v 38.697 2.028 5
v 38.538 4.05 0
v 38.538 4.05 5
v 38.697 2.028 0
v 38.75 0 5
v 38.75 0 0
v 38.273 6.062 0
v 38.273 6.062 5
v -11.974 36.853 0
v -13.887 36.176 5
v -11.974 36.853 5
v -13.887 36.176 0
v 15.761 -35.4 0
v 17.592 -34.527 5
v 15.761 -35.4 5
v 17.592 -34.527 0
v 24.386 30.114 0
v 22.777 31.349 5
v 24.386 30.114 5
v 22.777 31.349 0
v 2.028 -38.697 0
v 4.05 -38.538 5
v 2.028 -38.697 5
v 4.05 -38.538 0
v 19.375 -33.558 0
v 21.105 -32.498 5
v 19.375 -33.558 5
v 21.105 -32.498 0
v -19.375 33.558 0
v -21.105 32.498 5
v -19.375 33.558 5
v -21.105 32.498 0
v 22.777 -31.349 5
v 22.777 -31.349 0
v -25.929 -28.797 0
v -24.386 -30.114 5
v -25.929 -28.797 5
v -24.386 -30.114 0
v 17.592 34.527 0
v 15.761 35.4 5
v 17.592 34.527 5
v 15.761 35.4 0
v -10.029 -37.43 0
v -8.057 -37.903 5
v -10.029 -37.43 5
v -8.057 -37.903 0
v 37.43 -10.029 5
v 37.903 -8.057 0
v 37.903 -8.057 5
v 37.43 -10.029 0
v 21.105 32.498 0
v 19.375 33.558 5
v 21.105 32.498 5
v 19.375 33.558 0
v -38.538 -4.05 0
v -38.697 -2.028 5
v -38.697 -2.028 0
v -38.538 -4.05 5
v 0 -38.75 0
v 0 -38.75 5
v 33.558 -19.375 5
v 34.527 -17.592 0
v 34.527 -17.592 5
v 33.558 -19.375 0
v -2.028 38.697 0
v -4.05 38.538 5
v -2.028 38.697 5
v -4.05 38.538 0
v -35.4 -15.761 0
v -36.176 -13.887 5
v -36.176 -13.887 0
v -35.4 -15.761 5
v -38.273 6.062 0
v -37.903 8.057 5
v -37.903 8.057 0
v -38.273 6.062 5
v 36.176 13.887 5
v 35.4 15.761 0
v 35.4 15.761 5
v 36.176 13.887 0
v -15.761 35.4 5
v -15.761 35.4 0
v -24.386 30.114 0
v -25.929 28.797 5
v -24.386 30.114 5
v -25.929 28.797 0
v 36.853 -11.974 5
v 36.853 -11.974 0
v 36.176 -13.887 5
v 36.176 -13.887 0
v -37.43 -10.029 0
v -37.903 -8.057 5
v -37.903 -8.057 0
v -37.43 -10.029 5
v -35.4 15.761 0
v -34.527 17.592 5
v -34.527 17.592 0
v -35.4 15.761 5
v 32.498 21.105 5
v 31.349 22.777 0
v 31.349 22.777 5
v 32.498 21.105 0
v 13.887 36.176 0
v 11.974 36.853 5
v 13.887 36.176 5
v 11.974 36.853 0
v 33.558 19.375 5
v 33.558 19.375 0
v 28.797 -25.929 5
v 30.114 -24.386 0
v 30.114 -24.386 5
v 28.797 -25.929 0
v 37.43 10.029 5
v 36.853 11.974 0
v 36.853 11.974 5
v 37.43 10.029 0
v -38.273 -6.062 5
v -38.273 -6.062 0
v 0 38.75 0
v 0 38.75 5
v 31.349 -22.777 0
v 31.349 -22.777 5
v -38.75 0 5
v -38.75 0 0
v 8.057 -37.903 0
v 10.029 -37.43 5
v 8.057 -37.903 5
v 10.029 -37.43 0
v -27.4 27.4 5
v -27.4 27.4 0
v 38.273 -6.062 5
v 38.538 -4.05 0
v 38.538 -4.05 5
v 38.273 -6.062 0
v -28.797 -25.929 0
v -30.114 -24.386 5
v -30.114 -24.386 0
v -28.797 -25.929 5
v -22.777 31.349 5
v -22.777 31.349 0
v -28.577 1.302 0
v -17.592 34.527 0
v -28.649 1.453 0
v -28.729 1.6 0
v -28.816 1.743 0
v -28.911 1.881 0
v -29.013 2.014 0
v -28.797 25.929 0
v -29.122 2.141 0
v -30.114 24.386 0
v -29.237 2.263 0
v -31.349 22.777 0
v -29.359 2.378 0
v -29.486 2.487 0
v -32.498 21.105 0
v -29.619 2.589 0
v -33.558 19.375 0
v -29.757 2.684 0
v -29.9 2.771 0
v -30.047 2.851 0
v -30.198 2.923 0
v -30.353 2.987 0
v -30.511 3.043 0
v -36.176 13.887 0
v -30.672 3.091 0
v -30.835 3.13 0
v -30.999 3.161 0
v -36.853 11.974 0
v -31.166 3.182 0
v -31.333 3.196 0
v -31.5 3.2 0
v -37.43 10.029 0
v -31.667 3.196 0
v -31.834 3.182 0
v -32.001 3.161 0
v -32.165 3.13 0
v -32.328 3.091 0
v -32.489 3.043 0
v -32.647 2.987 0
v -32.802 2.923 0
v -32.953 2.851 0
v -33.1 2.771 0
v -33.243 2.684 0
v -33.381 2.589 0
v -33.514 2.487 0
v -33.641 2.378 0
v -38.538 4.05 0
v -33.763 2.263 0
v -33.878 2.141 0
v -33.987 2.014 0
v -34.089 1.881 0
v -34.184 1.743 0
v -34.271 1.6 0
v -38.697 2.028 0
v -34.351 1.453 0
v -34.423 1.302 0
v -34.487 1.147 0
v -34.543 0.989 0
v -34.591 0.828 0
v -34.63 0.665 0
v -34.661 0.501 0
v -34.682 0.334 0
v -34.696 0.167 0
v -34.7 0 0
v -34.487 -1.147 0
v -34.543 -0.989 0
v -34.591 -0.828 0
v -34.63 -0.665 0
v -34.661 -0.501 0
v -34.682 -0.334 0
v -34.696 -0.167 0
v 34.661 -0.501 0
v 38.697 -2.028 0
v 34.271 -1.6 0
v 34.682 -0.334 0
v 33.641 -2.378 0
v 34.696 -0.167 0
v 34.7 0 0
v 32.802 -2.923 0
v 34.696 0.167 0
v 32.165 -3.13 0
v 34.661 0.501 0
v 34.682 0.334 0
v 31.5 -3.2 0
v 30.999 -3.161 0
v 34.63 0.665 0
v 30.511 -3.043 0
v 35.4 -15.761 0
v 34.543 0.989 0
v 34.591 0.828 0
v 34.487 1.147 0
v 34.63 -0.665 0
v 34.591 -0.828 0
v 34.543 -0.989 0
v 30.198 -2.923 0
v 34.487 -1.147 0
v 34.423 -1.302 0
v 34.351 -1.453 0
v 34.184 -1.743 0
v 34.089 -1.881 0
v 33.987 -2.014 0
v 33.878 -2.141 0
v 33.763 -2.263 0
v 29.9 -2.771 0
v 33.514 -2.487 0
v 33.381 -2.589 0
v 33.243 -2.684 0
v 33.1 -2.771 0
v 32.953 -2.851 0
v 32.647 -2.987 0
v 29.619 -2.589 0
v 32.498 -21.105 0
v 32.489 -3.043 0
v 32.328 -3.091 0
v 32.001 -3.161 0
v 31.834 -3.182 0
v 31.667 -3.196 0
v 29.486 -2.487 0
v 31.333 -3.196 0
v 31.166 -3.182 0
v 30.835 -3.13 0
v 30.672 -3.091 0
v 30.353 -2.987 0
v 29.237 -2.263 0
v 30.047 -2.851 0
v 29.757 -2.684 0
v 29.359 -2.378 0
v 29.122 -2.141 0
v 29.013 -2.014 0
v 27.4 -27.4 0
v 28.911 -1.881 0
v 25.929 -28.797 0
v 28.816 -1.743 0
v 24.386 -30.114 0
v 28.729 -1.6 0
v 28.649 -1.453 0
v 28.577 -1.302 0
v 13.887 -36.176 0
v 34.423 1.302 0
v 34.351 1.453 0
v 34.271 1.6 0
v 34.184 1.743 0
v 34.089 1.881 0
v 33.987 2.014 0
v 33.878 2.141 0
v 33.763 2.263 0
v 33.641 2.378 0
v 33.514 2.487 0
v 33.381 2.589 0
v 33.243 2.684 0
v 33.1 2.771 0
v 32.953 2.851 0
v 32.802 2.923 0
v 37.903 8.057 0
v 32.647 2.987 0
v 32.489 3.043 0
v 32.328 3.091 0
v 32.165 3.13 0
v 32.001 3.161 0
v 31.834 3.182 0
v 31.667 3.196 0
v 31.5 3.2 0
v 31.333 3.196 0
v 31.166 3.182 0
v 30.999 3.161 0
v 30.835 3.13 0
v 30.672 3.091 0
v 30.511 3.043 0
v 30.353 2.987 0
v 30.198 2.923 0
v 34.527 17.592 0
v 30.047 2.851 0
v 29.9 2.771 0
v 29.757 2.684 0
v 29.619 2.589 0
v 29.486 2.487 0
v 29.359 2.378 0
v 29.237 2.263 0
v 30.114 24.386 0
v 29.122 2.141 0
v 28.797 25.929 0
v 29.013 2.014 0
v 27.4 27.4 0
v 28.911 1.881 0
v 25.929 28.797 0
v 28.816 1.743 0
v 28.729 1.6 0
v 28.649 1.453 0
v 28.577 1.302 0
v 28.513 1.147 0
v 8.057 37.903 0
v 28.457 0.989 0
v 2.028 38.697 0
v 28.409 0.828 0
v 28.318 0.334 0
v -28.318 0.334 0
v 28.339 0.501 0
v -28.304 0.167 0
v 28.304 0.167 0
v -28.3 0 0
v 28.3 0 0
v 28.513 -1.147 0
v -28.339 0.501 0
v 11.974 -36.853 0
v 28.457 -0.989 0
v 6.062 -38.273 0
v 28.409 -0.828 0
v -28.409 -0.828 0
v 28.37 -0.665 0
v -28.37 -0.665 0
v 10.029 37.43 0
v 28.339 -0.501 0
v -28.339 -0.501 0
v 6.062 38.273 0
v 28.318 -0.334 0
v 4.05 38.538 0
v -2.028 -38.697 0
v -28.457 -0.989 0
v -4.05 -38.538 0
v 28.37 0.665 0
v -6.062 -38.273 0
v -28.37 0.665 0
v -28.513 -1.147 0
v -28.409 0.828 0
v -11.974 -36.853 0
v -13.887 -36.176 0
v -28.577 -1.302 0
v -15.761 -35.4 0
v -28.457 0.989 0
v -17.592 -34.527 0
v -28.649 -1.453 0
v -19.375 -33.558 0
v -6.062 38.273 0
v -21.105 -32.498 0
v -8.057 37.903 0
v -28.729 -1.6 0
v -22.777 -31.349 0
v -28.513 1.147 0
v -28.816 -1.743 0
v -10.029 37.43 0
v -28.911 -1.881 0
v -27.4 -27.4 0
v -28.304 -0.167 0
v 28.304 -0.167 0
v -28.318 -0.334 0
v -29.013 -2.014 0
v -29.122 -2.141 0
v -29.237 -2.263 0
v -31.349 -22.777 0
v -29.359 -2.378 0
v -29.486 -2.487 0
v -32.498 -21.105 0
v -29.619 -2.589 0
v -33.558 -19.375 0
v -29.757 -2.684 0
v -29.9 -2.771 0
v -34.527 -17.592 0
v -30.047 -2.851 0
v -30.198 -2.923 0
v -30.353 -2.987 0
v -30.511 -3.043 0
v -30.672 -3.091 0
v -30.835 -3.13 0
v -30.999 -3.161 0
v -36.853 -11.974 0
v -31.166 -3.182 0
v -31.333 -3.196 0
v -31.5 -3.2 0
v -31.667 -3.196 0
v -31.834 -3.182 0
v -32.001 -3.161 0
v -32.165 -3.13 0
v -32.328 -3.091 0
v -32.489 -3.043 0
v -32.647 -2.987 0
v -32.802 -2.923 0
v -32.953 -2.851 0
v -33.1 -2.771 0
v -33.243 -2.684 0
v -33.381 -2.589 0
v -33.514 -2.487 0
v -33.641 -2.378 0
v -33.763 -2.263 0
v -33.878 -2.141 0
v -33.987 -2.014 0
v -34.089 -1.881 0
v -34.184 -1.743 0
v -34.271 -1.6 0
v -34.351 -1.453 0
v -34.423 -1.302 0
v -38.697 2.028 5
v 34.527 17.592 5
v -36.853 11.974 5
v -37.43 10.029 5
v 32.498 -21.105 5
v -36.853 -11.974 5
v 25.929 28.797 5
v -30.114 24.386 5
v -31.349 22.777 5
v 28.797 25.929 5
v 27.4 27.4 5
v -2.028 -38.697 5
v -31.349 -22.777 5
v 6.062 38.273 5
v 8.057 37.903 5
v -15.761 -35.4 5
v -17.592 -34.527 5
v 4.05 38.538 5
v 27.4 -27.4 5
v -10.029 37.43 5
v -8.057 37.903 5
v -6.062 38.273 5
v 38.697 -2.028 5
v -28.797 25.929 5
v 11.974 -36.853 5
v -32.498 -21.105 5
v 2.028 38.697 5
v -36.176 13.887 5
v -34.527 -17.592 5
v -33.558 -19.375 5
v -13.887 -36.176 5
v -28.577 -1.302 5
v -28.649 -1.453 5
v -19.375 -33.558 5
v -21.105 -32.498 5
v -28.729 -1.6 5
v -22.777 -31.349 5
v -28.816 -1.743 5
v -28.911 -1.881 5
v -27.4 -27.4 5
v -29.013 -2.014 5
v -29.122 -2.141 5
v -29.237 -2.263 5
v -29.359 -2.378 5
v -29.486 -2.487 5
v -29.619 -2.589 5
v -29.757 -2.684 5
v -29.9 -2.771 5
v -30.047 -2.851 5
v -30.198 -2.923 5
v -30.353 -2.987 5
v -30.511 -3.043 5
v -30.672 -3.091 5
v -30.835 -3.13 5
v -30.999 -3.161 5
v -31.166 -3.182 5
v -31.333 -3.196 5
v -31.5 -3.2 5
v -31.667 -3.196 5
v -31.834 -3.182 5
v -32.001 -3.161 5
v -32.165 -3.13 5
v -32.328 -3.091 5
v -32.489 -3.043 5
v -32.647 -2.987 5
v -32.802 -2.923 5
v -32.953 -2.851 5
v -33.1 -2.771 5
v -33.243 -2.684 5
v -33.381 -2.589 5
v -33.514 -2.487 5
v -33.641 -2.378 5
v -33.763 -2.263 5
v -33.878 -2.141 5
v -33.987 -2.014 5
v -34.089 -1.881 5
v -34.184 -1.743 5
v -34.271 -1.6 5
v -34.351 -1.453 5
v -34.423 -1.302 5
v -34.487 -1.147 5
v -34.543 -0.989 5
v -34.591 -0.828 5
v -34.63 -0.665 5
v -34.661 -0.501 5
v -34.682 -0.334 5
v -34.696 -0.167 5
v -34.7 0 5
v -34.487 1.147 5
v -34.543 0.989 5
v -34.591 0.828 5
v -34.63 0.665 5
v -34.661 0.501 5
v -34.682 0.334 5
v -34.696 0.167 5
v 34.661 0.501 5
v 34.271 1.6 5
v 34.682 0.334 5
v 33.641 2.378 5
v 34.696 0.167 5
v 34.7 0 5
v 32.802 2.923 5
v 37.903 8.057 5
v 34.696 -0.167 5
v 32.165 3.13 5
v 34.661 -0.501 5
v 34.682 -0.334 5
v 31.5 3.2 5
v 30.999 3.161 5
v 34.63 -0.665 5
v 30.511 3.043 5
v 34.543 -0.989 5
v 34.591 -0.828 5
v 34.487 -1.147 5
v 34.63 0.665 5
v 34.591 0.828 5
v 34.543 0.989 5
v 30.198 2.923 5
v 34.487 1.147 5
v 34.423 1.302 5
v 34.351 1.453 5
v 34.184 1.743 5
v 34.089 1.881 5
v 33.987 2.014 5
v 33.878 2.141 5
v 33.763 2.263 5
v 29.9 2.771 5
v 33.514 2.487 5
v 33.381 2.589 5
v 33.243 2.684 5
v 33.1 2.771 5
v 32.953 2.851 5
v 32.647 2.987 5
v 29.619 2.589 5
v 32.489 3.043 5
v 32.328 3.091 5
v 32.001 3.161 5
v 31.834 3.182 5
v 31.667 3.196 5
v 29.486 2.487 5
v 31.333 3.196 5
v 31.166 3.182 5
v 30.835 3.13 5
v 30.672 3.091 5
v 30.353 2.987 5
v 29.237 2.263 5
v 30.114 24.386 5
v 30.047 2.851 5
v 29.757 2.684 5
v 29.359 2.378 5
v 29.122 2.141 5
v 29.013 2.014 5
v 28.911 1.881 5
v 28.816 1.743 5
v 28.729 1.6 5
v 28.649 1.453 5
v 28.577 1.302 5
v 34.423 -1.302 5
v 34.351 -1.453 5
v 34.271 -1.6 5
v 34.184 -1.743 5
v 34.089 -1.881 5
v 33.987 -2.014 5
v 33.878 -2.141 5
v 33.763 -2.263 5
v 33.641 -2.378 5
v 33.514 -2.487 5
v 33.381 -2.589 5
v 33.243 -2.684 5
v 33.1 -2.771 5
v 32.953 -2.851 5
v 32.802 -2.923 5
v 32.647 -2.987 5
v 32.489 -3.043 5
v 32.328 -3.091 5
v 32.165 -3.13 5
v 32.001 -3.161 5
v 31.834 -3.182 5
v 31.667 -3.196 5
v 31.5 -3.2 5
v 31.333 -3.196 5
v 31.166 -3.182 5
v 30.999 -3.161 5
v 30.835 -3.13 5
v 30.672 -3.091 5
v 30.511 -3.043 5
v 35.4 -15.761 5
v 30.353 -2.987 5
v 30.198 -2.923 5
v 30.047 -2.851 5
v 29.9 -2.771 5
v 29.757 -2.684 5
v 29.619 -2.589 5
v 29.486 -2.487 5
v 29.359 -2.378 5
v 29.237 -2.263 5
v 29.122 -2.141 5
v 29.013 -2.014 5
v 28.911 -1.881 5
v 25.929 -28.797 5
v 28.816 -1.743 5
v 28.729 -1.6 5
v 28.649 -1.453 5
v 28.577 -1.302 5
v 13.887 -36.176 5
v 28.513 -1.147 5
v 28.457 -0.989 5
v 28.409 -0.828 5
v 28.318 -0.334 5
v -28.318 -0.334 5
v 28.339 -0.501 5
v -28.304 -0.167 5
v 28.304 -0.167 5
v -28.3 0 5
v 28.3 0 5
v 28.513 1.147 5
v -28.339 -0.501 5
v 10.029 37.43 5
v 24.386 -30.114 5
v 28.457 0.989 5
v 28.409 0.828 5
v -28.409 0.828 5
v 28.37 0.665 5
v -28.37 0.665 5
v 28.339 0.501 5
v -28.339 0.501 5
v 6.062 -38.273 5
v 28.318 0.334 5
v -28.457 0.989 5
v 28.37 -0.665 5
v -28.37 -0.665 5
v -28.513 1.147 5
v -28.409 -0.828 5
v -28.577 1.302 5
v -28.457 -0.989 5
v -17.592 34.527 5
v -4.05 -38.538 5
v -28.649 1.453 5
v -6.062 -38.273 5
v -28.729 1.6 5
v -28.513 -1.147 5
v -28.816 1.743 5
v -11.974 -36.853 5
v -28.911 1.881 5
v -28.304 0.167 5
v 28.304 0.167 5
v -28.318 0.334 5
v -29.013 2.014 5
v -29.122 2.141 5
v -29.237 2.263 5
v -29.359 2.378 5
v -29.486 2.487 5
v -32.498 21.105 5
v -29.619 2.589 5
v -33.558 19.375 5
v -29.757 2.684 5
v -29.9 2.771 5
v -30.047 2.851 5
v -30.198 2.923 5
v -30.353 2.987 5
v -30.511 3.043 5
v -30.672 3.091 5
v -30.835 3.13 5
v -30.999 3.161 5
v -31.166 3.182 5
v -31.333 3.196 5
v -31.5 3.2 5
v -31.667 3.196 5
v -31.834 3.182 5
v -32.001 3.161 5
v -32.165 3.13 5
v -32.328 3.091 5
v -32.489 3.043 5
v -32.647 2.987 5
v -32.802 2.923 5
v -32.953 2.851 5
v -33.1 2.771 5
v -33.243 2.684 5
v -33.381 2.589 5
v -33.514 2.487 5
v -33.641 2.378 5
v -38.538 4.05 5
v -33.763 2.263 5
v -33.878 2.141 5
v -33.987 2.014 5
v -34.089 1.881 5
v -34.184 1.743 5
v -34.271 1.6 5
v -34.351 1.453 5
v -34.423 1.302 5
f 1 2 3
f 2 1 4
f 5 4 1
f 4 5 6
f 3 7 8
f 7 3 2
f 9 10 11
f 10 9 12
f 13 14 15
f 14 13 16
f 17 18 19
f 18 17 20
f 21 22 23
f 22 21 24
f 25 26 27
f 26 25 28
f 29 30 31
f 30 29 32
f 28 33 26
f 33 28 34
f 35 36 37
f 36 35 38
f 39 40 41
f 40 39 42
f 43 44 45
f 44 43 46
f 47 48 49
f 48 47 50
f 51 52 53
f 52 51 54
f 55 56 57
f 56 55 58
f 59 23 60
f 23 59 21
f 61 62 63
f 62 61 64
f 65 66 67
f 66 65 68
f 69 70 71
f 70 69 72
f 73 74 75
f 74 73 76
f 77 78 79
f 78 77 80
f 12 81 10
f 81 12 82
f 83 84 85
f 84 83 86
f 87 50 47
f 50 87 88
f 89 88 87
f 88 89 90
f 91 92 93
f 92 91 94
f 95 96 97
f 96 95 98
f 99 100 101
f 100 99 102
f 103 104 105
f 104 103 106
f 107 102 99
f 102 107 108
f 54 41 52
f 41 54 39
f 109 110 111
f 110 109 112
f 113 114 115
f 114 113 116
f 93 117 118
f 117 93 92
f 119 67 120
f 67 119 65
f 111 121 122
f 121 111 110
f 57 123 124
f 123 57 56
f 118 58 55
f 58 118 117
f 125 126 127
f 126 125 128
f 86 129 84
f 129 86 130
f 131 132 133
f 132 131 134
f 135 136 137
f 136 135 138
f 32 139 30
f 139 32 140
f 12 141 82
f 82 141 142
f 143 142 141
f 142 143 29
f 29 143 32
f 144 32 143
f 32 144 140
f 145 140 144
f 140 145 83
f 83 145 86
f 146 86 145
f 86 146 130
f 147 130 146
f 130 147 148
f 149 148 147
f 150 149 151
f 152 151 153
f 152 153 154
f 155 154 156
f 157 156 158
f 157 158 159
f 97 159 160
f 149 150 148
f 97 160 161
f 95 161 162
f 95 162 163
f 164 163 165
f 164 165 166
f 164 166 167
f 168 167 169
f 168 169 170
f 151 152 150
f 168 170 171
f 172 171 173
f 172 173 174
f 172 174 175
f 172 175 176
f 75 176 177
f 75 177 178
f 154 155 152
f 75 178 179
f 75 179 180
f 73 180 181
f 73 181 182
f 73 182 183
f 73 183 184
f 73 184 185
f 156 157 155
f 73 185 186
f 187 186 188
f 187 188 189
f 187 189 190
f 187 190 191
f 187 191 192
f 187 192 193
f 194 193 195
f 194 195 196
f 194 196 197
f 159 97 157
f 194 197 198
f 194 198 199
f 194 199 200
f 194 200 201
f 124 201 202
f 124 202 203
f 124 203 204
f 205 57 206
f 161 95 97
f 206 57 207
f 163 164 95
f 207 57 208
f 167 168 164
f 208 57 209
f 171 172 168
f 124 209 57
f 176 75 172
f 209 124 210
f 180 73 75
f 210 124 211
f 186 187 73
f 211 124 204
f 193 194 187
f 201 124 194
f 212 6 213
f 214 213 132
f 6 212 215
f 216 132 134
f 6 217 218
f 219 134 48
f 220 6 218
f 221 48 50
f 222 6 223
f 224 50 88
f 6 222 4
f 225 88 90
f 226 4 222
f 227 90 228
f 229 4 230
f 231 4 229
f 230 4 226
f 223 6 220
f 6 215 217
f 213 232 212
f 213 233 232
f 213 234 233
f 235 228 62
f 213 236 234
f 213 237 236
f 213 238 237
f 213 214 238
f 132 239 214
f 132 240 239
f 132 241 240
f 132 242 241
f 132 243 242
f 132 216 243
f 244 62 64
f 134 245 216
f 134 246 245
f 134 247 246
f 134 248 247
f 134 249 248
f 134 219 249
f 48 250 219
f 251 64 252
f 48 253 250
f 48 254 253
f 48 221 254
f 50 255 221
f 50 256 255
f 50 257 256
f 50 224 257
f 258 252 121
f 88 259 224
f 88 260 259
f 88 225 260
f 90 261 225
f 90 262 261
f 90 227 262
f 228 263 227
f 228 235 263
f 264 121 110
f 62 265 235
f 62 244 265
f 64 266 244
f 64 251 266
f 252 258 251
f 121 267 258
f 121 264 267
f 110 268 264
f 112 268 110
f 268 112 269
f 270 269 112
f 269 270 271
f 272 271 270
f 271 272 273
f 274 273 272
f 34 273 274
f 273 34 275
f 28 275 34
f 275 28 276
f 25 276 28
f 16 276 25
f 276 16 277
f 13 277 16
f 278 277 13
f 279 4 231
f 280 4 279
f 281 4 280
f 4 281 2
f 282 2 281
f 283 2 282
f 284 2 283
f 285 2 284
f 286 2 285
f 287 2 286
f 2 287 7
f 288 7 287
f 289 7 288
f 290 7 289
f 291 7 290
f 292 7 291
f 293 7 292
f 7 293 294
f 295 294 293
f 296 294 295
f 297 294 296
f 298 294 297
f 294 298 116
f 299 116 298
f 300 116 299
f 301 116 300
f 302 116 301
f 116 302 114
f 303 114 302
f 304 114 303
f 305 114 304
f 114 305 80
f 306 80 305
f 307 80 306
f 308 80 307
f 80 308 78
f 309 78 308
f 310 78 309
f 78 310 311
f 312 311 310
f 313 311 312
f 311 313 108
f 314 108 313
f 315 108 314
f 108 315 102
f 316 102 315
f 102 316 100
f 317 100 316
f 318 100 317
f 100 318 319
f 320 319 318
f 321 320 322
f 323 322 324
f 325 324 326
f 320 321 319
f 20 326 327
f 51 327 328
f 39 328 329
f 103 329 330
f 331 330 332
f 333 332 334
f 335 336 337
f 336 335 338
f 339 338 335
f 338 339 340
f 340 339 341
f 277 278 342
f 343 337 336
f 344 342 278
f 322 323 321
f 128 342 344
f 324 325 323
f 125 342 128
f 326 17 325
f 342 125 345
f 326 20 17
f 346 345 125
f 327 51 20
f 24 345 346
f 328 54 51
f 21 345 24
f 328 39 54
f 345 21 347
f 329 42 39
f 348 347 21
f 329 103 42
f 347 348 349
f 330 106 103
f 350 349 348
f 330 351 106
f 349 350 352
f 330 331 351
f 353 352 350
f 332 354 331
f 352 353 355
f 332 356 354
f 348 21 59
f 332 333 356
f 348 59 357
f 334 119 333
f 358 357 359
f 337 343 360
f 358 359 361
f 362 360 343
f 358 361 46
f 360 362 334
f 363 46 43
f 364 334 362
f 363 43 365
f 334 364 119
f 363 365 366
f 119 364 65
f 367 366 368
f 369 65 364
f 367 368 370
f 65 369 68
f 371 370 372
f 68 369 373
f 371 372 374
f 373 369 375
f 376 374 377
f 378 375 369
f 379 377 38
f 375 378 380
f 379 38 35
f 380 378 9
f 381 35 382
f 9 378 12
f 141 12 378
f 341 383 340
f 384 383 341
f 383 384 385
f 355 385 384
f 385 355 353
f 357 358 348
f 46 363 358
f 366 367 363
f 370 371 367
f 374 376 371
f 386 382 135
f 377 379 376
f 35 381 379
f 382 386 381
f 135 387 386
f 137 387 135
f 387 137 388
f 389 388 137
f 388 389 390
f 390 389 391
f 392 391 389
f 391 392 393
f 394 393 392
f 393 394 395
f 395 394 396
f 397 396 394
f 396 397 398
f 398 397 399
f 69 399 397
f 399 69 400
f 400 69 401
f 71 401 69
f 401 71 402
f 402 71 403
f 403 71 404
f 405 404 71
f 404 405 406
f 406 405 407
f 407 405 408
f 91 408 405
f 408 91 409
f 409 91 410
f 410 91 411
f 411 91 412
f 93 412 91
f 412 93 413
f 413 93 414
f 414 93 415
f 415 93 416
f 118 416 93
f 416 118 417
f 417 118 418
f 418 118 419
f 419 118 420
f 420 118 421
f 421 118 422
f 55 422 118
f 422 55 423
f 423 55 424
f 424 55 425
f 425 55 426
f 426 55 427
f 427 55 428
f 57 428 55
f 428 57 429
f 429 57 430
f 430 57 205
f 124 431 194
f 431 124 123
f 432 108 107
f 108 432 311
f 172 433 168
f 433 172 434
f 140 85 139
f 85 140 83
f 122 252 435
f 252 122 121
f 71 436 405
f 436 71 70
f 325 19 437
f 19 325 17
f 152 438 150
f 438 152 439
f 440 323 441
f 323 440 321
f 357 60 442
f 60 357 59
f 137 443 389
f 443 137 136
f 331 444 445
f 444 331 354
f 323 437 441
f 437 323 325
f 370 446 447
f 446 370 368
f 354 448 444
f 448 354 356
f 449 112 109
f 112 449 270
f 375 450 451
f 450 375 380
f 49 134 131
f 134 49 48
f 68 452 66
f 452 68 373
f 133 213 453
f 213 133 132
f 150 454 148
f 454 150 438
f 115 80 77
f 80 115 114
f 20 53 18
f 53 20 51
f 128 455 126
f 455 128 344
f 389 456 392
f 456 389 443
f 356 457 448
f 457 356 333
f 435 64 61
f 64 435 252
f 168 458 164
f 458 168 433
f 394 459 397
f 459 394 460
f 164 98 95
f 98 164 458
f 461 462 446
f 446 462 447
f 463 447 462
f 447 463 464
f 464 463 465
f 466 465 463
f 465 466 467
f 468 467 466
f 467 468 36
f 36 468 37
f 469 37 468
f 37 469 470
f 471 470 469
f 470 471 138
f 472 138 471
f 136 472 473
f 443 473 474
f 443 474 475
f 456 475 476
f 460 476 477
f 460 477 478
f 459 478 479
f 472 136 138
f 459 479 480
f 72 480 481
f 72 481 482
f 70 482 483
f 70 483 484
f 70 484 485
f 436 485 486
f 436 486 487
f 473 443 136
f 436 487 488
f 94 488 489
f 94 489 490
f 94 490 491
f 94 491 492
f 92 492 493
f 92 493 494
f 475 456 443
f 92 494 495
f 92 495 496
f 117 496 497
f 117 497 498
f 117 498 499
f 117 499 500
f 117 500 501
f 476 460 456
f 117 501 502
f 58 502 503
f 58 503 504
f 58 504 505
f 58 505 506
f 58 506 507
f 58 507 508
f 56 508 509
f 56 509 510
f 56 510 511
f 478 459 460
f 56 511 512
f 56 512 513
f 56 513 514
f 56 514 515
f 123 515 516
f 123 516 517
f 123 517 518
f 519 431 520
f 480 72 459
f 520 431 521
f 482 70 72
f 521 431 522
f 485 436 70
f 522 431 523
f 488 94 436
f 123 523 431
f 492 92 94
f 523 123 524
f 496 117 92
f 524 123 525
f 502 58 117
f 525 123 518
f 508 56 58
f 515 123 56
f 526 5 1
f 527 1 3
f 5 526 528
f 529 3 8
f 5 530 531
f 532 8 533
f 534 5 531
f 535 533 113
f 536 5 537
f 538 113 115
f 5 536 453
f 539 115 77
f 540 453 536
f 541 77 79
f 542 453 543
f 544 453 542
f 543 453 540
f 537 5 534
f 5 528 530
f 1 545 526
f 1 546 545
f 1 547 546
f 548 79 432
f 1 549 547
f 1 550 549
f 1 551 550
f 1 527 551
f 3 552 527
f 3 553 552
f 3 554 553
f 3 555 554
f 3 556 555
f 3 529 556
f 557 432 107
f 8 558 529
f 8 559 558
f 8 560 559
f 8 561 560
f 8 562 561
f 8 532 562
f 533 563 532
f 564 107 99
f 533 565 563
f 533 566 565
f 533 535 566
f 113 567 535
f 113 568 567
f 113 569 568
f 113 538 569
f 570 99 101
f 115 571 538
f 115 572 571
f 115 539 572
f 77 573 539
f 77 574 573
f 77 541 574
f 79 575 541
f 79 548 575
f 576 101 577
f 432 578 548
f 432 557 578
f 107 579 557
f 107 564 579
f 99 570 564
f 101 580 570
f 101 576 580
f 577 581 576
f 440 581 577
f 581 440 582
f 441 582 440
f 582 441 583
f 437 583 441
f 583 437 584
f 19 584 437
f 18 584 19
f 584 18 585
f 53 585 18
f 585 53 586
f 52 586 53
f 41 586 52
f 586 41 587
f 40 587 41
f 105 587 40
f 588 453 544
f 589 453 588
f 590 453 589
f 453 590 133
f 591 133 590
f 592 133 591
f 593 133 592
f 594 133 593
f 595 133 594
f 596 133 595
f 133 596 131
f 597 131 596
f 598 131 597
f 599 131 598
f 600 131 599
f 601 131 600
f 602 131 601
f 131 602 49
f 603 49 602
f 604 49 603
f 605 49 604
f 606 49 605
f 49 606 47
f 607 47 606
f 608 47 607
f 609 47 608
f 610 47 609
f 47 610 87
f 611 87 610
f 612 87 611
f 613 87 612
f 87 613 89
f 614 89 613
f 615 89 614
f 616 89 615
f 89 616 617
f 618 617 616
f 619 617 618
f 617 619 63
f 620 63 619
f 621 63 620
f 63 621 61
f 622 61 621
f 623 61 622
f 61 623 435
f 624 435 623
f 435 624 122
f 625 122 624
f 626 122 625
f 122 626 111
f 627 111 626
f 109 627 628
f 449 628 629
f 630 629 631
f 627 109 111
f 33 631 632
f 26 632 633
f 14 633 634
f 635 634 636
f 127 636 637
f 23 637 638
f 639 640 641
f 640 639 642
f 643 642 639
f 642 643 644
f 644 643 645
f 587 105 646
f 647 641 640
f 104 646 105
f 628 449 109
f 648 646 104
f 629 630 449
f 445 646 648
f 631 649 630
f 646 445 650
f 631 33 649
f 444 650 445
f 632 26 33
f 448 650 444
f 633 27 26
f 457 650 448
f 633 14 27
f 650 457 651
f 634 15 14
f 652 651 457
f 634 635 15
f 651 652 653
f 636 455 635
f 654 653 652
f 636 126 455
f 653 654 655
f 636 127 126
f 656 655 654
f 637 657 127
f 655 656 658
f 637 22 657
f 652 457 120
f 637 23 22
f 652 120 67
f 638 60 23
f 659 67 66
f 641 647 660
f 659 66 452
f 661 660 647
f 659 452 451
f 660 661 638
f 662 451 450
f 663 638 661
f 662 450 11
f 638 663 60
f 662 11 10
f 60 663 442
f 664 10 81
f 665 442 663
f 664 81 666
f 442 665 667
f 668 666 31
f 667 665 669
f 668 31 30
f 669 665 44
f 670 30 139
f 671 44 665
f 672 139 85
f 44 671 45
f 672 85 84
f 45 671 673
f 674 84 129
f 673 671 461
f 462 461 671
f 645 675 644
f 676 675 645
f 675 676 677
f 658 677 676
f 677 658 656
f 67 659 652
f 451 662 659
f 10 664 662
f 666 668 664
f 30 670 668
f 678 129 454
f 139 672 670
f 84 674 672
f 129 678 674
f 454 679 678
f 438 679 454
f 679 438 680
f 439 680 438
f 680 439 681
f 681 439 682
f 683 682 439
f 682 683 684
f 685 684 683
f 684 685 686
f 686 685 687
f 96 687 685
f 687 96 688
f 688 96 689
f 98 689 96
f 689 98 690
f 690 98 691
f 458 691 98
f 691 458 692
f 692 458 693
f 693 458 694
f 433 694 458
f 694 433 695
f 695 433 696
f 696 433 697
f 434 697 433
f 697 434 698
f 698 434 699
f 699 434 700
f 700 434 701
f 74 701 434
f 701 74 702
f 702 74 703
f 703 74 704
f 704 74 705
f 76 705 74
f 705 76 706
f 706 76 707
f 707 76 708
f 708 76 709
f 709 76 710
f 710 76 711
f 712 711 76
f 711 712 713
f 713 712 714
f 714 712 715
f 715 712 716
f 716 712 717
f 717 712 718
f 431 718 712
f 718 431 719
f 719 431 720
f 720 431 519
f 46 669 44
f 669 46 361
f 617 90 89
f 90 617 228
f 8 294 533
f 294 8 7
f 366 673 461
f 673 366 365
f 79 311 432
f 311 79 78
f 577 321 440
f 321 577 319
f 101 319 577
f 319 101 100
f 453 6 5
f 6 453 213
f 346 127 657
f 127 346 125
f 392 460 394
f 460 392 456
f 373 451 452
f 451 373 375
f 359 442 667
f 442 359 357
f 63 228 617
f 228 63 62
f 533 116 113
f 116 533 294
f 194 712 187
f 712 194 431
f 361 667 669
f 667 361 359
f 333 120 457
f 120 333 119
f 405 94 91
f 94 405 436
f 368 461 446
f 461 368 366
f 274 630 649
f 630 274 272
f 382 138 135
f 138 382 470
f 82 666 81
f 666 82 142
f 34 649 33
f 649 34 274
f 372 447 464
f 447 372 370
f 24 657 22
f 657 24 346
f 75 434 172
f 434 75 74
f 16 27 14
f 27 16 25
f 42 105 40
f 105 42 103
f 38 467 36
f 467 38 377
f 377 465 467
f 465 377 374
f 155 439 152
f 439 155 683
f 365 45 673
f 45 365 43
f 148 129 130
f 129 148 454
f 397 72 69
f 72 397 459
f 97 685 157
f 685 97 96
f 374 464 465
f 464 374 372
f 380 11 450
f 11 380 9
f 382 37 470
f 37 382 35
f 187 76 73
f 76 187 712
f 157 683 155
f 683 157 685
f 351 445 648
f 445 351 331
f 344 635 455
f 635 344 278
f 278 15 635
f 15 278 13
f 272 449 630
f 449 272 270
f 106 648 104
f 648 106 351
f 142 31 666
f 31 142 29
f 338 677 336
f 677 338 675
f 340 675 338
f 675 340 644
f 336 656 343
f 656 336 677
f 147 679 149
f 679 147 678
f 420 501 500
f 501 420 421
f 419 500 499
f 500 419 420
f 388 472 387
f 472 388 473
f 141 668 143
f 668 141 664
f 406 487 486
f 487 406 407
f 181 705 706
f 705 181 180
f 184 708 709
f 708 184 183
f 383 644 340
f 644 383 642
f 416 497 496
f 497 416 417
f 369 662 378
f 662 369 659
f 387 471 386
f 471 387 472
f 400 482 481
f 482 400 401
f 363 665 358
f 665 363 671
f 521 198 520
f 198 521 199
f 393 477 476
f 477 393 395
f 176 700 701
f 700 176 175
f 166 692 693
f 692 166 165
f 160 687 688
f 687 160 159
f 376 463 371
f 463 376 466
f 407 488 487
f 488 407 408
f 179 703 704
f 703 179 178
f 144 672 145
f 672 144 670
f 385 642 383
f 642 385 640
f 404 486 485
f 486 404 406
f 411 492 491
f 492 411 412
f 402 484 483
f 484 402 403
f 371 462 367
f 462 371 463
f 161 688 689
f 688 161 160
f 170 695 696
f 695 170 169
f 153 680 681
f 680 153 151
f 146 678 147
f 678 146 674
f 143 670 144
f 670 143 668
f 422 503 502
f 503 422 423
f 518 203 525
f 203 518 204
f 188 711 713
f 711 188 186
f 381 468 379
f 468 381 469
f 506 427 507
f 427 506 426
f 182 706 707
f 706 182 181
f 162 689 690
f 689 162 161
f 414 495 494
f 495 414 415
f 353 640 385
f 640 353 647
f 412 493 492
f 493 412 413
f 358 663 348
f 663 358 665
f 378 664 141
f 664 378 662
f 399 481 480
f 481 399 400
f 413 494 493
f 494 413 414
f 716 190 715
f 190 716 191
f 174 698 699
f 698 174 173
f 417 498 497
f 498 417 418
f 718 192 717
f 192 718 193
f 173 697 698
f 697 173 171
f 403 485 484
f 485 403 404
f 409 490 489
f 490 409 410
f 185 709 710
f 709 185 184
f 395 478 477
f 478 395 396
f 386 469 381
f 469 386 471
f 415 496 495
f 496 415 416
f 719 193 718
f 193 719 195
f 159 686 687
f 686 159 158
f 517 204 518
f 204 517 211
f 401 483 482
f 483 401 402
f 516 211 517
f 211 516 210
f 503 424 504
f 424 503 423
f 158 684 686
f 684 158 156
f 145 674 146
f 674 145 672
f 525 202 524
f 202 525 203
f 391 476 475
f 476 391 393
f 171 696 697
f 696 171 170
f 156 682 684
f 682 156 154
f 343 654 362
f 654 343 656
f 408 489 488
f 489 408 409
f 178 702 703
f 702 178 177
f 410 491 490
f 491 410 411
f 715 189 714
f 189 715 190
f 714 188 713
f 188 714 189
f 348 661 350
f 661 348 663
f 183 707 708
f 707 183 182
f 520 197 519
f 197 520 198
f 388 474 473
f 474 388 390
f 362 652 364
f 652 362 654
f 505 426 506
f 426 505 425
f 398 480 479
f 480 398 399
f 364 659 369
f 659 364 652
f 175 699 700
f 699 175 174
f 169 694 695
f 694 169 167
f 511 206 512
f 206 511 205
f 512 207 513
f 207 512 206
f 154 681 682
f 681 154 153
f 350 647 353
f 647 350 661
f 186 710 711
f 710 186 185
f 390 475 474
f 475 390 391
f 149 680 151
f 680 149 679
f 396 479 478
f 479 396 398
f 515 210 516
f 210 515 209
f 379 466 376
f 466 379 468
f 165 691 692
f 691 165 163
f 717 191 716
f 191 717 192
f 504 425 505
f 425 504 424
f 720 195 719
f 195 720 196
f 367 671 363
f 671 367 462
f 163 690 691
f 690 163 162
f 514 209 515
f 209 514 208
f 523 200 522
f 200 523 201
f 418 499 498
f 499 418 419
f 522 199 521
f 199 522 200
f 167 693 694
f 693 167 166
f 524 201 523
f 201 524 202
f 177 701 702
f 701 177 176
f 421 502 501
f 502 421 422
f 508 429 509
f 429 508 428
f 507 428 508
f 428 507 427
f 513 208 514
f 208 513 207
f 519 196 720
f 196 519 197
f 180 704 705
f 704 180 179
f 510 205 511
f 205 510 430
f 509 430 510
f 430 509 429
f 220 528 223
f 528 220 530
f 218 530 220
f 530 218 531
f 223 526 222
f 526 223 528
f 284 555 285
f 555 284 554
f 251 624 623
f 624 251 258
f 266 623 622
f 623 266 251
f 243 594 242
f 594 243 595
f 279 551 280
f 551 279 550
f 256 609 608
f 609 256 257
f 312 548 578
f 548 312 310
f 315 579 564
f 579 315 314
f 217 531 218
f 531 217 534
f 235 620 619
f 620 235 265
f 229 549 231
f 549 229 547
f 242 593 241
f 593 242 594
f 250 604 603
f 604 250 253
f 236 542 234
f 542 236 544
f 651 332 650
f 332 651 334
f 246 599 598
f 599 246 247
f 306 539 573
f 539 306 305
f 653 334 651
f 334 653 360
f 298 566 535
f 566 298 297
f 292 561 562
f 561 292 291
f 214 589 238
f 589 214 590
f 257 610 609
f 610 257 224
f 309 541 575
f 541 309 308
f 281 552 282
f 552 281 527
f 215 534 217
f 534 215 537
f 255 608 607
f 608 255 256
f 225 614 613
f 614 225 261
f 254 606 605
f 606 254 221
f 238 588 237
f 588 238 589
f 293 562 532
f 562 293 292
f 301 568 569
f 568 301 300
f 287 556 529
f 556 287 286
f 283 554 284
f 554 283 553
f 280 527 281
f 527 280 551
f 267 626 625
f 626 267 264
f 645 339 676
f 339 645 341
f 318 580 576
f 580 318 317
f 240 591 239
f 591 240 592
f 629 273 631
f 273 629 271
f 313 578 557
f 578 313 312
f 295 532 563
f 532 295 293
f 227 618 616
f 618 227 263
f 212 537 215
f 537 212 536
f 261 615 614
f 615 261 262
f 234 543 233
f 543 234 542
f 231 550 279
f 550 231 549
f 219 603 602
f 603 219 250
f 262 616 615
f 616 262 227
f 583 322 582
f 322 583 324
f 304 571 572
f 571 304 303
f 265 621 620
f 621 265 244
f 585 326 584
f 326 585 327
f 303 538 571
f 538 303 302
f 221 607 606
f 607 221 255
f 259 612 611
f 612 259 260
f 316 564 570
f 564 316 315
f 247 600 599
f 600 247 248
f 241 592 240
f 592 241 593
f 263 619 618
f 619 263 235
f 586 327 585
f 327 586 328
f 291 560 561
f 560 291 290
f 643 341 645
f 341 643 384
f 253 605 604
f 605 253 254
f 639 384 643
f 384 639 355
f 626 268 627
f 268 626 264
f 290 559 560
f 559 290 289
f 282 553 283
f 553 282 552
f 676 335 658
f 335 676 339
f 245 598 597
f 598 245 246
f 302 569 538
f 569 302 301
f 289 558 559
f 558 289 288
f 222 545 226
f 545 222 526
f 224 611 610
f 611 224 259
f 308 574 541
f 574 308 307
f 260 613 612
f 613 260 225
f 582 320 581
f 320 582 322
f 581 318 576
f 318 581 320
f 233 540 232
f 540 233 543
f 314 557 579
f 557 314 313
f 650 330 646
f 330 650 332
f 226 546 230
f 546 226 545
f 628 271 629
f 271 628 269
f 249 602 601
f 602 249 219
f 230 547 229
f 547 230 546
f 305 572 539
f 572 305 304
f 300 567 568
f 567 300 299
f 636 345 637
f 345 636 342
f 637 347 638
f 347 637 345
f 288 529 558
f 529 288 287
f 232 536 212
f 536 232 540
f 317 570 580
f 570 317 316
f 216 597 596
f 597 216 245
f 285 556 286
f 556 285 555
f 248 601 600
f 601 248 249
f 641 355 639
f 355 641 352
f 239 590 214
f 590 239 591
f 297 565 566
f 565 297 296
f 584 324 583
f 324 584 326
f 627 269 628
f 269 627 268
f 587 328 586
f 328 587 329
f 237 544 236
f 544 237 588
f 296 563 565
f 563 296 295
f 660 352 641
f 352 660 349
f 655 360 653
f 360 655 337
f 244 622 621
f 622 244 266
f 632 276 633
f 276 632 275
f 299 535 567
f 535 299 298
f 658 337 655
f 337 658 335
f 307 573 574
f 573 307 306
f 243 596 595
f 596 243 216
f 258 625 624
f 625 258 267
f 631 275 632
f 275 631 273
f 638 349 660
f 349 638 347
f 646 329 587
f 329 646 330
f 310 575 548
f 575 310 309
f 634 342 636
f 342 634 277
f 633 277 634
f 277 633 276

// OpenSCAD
// Mounting plate for gripperlite
// Matches the mating surface outline at Z=0
// Outer: circle r=38.75mm, two bolt holes d=6.4mm at X=±31.5

$fn = 120;  // smooth circles

plate_thickness = 5;  // mm
outer_radius = 38.75;
hole_diameter = 6.4;
hole_radius = hole_diameter / 2;
hole_spacing = 31.5;  // from center

difference() {
    // Main disc
    cylinder(h = plate_thickness, r = outer_radius, center = false);

    // Bolt hole 1 (X = -31.5, Y = 0)
    translate([-hole_spacing, 0, -1])
        cylinder(h = plate_thickness + 2, r = hole_radius);

    // Bolt hole 2 (X = +31.5, Y = 0)
    translate([hole_spacing, 0, -1])
        cylinder(h = plate_thickness + 2, r = hole_radius);
}
